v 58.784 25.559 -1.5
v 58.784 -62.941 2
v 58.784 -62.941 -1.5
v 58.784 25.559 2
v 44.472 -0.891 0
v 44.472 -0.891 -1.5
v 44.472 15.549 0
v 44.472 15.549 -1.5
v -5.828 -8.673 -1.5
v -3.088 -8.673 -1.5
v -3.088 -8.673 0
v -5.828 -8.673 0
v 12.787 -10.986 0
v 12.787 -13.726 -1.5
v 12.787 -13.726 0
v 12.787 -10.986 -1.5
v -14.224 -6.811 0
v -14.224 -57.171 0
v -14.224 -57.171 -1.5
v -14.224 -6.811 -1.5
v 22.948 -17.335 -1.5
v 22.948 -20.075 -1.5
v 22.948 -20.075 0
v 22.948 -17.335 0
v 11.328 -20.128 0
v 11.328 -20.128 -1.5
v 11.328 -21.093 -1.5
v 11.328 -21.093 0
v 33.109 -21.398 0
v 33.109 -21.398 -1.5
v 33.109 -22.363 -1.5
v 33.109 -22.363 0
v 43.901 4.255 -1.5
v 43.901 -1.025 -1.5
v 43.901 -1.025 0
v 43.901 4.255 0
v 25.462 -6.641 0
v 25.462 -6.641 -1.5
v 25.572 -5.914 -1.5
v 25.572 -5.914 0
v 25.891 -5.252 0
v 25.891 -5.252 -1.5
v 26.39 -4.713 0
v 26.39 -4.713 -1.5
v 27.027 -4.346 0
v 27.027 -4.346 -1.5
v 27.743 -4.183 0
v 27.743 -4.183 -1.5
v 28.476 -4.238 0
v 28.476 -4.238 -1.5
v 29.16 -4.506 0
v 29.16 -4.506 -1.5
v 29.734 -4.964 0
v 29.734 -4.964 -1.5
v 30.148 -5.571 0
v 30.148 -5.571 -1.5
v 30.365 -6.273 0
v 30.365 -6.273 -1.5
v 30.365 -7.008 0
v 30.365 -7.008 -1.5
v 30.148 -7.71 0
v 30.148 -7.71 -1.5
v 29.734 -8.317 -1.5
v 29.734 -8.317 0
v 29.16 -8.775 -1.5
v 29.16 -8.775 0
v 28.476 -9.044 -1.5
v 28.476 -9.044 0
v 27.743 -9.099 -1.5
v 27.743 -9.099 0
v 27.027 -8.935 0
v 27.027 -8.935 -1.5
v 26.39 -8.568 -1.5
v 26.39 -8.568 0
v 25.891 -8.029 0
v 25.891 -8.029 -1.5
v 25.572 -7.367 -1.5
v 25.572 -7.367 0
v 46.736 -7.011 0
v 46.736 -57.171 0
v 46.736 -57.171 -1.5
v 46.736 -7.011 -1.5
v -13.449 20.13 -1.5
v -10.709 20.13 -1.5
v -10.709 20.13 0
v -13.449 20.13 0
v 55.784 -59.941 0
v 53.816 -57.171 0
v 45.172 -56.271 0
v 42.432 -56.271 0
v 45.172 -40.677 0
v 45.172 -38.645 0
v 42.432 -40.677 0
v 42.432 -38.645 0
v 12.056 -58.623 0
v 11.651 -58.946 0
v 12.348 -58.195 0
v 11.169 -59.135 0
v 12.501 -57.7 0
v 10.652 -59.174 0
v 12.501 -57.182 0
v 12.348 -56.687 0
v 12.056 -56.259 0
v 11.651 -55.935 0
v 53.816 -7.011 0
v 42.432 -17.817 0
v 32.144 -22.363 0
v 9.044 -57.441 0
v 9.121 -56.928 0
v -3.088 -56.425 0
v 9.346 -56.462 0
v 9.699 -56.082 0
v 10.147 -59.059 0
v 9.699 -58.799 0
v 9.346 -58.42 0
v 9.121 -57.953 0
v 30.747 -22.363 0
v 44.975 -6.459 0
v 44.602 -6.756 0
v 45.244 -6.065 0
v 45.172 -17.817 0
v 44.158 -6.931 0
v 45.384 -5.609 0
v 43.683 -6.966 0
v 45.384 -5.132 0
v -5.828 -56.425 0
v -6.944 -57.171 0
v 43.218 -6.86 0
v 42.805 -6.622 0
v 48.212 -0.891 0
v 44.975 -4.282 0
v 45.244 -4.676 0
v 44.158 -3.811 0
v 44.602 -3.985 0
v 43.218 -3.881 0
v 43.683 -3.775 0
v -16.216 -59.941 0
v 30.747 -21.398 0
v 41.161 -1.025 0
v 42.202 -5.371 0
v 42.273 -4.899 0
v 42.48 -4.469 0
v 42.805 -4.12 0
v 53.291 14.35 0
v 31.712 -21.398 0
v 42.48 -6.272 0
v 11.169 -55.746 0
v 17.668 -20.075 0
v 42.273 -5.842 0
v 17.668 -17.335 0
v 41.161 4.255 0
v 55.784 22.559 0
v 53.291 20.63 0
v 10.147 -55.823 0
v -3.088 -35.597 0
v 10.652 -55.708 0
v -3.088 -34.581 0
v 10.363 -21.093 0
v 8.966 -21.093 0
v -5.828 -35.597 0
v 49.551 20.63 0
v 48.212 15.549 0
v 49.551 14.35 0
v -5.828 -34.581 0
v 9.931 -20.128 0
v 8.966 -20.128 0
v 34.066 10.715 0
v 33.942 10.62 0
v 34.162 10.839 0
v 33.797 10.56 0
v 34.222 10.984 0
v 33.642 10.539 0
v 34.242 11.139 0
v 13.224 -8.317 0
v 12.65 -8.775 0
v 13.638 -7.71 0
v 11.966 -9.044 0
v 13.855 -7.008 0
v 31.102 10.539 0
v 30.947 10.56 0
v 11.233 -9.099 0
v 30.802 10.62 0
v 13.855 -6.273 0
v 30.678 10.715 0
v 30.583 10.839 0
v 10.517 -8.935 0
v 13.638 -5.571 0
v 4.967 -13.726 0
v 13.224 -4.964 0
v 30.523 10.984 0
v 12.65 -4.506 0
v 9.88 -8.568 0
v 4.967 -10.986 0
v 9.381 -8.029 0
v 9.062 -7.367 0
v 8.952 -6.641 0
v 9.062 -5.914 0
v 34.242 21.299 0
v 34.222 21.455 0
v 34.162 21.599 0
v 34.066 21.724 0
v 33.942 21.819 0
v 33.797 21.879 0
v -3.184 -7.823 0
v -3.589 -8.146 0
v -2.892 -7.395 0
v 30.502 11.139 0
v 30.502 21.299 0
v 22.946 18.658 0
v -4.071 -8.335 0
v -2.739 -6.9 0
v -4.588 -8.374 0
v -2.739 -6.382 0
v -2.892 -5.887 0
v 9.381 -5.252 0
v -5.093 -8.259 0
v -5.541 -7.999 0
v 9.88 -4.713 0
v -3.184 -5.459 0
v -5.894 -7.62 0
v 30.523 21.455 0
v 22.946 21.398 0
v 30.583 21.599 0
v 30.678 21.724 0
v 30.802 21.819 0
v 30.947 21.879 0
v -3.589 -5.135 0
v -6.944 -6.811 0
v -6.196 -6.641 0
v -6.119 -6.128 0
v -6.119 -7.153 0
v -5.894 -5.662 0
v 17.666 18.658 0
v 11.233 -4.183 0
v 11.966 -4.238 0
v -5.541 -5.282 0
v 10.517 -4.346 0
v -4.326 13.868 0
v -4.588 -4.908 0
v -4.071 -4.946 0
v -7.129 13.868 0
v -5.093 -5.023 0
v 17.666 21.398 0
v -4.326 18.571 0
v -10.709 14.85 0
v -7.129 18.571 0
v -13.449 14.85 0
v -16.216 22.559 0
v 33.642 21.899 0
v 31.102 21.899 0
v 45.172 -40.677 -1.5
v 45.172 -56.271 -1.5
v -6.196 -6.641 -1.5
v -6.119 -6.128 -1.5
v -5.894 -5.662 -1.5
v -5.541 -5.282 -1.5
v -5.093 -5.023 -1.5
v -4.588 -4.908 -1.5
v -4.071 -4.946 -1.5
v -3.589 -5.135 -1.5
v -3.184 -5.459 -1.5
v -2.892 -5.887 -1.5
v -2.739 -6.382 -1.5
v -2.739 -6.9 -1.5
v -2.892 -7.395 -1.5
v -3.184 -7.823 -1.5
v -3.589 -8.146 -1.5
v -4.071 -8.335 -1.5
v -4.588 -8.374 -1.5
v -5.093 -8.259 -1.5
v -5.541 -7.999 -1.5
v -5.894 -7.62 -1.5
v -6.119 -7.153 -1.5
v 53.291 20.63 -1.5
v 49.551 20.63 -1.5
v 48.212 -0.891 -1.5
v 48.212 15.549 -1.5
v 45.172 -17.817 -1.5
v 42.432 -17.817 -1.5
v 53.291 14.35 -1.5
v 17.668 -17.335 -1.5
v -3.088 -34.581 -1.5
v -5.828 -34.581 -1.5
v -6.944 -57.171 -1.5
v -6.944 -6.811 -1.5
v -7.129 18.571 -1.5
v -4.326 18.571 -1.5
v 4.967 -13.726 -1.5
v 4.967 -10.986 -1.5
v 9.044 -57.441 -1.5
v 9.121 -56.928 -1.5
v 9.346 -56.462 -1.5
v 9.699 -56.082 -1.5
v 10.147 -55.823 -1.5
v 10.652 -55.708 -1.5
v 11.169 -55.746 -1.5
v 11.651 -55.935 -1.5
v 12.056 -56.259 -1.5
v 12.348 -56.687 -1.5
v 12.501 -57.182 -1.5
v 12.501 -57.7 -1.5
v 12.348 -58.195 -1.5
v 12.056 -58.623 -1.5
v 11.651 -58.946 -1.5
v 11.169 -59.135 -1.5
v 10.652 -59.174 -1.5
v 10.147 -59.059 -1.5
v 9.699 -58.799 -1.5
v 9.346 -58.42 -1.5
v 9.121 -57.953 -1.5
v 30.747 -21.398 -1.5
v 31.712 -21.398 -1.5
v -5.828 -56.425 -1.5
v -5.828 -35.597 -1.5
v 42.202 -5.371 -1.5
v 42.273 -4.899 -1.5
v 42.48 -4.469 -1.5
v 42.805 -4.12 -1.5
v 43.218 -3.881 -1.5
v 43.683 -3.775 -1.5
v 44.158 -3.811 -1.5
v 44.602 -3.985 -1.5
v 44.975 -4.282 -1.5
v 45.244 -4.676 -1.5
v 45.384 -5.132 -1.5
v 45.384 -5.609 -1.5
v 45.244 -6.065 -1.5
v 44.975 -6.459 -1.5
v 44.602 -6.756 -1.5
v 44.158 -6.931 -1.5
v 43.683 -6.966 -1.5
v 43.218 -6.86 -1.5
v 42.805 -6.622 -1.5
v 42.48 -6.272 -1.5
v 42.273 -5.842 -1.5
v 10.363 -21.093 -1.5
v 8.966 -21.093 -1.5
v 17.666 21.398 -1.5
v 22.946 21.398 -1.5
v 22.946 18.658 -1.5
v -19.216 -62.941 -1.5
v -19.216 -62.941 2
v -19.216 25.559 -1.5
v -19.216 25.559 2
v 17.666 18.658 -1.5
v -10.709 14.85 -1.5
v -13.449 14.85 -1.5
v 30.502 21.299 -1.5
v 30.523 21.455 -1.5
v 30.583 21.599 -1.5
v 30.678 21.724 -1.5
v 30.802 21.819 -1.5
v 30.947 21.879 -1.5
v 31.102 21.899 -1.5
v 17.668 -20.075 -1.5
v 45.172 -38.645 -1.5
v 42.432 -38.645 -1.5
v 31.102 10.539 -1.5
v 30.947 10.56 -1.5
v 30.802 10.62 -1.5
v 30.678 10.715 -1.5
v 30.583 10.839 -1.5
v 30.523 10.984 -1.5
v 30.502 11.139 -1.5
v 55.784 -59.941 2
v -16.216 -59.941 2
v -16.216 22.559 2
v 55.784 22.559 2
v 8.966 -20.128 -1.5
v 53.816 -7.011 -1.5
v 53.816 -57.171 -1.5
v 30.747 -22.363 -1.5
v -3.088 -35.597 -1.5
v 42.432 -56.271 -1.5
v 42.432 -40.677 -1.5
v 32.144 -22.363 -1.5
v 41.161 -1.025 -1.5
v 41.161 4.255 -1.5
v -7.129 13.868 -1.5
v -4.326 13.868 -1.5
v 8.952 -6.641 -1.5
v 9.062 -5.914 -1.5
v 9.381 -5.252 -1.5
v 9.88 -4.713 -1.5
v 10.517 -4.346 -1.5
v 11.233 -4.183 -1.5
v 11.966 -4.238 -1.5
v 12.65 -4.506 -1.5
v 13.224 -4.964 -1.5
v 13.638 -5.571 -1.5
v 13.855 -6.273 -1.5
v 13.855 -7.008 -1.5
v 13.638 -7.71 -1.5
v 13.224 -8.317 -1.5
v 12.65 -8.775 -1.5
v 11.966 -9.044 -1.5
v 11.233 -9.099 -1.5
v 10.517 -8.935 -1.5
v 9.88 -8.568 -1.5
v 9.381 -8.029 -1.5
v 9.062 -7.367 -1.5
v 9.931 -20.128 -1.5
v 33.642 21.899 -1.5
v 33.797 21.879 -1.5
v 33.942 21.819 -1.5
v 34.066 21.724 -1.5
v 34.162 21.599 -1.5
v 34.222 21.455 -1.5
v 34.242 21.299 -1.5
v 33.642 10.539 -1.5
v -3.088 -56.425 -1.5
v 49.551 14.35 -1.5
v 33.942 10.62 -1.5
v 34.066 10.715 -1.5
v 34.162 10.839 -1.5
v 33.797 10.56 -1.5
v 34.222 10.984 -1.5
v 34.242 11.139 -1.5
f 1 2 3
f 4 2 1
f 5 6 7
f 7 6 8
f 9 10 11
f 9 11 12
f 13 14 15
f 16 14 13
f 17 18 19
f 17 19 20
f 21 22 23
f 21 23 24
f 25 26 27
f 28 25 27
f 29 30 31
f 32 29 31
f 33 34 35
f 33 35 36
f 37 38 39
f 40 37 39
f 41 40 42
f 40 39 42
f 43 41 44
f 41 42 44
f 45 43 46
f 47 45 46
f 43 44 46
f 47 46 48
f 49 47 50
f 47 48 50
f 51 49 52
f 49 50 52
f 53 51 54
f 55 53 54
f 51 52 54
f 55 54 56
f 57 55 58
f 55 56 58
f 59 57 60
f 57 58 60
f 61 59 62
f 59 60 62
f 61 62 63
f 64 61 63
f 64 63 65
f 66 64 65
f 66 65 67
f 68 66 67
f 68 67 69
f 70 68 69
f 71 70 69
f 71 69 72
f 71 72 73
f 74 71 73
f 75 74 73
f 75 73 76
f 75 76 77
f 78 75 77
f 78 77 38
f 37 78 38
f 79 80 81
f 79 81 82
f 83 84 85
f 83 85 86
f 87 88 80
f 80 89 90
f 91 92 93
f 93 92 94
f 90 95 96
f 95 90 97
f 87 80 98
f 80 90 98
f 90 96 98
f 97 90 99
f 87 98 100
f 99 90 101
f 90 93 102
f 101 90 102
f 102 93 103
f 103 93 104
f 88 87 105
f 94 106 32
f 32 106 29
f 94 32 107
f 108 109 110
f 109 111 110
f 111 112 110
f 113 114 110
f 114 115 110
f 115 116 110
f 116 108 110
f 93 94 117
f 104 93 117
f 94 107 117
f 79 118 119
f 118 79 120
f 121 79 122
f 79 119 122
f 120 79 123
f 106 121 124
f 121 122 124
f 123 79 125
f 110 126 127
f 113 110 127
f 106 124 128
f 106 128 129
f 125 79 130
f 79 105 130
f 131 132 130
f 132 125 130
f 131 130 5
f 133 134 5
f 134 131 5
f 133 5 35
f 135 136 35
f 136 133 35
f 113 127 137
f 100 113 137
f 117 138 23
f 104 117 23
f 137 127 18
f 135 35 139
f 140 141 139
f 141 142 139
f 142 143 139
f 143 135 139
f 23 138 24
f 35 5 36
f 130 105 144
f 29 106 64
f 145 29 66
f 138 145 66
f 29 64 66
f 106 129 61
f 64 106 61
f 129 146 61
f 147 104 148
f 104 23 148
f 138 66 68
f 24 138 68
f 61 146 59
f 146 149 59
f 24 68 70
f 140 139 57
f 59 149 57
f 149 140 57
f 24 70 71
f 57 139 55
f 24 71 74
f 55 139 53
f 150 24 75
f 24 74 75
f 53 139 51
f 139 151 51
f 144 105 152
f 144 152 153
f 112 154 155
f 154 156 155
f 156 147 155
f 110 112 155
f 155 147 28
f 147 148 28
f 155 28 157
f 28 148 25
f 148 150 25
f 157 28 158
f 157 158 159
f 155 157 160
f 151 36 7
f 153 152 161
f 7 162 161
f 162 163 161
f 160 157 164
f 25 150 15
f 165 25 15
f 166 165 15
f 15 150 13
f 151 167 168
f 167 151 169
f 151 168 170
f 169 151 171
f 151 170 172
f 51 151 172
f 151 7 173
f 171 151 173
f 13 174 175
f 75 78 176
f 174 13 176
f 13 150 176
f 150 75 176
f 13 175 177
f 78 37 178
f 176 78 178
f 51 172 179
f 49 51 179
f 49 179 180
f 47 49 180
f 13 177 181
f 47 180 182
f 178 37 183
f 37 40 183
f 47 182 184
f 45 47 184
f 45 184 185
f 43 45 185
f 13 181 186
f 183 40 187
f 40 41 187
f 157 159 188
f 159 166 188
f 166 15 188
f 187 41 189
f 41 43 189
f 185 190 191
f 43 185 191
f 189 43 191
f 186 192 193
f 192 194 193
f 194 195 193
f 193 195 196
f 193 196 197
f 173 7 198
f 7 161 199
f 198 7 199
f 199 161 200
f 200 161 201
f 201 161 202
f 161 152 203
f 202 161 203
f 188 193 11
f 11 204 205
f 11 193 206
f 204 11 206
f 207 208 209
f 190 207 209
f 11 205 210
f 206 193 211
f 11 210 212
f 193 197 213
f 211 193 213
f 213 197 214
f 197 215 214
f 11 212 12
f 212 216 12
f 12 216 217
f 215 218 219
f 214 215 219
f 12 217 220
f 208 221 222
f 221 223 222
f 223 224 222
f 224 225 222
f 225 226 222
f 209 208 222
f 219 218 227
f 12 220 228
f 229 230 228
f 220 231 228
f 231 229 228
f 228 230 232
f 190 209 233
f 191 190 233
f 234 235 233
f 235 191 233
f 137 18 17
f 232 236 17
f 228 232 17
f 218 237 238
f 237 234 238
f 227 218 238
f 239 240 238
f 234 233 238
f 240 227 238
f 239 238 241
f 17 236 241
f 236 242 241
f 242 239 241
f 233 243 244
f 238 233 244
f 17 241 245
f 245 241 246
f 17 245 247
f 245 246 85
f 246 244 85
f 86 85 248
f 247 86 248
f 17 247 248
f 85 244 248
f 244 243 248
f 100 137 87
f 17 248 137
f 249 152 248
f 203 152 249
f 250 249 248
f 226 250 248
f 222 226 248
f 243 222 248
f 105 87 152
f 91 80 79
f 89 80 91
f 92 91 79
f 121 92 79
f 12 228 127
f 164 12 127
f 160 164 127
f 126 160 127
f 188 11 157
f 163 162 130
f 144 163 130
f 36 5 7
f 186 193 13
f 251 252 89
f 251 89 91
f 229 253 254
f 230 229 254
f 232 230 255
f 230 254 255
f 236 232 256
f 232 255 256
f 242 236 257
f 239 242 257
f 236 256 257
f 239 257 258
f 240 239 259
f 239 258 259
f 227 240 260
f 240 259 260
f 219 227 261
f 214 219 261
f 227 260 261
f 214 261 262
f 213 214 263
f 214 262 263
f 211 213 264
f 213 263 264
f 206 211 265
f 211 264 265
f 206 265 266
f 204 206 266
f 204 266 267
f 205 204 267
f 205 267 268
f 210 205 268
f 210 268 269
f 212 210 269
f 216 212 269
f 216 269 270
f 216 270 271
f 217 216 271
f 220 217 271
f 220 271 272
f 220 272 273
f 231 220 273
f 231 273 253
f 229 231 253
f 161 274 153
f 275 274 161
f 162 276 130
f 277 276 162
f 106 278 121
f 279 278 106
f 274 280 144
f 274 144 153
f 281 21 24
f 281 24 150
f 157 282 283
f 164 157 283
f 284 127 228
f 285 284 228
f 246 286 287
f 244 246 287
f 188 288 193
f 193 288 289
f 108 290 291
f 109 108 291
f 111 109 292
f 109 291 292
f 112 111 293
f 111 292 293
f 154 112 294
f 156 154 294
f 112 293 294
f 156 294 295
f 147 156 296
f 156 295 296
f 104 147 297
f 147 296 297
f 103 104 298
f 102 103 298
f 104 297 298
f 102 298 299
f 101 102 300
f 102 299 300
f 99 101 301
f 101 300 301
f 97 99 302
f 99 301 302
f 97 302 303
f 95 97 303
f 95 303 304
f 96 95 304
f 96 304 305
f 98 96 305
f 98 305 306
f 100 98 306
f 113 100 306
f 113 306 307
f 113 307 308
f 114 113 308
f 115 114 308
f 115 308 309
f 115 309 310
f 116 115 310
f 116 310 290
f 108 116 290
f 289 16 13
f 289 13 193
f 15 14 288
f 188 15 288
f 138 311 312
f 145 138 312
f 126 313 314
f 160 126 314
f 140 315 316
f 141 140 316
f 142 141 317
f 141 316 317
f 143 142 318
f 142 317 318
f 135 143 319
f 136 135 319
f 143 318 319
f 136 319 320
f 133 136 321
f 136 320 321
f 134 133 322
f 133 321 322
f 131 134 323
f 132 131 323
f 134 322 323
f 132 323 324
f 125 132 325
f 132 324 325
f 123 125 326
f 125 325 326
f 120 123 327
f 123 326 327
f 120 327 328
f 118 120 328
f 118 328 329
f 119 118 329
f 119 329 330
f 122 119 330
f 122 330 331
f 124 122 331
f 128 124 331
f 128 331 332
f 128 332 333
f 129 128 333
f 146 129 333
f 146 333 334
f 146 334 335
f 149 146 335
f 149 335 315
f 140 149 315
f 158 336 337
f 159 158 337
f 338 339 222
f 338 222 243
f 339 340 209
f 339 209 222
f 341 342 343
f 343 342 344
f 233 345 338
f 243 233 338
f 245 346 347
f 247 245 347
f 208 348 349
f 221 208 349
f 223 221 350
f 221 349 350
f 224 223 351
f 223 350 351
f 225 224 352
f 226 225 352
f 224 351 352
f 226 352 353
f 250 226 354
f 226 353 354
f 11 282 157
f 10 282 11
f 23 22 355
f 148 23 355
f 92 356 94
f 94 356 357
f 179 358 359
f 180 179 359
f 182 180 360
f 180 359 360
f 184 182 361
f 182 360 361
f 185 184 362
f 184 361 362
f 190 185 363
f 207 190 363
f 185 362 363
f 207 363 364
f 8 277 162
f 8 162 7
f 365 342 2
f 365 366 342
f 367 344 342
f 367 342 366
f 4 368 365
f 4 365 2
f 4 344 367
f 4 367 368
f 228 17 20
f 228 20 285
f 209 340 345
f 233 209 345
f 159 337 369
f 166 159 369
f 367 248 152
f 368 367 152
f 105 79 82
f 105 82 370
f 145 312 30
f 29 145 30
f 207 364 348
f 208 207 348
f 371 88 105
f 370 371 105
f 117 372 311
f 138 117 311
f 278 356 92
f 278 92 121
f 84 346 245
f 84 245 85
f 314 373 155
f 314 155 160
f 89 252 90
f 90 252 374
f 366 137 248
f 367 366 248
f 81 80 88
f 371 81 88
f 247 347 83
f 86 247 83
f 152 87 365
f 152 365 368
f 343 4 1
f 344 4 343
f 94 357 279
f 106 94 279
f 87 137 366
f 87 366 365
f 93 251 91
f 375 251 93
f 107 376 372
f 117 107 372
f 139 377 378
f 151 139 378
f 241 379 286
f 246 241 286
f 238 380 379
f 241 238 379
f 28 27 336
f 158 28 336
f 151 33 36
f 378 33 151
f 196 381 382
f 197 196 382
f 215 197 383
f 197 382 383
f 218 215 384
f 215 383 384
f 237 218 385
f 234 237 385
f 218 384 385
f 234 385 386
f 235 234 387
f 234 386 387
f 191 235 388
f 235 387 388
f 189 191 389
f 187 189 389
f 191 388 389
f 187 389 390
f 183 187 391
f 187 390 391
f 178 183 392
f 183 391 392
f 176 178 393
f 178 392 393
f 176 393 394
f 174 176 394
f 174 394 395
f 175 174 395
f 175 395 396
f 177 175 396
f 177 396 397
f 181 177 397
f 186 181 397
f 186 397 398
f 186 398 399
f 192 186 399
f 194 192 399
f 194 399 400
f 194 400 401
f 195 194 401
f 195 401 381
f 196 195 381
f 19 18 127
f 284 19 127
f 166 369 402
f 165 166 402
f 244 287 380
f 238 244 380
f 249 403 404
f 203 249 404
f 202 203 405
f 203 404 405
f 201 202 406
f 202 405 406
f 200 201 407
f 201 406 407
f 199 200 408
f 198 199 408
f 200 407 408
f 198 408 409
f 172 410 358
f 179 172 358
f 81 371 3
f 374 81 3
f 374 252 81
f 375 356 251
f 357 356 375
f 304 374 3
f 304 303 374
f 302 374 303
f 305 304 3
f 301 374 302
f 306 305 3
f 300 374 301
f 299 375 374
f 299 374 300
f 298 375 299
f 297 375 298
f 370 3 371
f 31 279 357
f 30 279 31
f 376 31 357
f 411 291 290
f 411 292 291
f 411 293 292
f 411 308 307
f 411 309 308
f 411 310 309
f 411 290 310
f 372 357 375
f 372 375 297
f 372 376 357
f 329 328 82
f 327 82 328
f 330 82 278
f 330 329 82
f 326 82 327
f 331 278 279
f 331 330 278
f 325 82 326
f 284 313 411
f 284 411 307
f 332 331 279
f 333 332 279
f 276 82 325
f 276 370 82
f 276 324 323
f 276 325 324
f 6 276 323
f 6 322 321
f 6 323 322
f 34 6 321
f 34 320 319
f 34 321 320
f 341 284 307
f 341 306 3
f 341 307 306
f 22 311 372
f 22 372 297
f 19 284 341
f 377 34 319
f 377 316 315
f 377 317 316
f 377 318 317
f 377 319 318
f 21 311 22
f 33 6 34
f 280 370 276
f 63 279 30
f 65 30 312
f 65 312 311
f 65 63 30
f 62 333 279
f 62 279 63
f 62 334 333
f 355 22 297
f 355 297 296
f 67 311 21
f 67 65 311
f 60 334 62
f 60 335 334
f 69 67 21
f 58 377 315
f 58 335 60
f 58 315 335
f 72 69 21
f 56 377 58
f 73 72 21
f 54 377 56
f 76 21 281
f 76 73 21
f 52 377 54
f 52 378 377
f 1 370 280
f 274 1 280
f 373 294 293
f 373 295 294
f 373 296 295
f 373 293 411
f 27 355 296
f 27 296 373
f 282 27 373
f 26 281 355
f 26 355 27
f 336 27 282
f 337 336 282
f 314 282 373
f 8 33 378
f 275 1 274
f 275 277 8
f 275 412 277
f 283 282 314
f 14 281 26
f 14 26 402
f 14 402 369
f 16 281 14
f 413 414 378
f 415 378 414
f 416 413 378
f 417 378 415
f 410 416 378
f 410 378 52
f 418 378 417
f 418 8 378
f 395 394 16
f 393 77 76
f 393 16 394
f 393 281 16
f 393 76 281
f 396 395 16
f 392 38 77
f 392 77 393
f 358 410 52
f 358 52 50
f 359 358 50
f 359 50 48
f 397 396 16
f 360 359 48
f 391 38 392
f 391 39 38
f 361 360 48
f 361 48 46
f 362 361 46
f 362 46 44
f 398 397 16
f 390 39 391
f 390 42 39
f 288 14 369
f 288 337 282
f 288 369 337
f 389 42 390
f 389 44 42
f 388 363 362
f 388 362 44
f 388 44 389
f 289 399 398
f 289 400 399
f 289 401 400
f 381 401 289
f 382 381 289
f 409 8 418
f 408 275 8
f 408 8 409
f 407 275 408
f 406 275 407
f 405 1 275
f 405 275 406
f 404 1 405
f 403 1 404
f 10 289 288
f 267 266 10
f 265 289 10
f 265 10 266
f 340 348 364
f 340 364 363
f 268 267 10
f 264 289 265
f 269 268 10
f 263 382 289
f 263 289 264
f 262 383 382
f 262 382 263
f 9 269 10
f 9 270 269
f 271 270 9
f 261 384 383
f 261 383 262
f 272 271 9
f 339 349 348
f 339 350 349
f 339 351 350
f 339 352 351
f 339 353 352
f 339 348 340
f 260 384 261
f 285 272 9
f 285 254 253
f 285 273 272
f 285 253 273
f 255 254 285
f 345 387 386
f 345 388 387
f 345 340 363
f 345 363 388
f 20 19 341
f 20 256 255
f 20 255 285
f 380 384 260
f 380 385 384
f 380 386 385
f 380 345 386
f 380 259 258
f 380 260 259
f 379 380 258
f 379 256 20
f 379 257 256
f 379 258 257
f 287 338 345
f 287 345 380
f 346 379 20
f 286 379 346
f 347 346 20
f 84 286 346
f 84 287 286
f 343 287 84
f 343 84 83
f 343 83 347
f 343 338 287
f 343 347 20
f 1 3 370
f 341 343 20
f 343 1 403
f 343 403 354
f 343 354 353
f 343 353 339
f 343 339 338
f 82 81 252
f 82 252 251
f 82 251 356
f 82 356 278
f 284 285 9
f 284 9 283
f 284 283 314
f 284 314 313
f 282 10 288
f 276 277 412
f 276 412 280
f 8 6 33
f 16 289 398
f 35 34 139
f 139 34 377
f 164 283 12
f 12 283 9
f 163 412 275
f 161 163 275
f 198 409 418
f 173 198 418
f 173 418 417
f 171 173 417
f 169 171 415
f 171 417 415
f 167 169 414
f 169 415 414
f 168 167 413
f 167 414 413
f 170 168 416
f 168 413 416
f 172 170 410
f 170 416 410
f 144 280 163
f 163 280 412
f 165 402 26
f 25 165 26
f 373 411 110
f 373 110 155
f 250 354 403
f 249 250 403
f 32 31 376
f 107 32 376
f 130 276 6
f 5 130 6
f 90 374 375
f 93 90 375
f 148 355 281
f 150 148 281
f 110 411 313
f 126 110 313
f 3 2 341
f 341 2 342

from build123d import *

# Parameters (mm, degrees)
SKETCH1_W           = 78
SKETCH1_H           = 88.5
SKETCH1_W_2         = 72
SKETCH1_H_2         = 82.5
BOSS_EXTRUDE1_DEPTH = 2
SKETCH2_W           = 78
SKETCH2_H           = 88.5
BOSS_EXTRUDE2_DEPTH = 1.5
SKETCH7_W           = 7.279998142
SKETCH7_H           = 50.36
SKETCH7_W_2         = 7.079999996
SKETCH7_H_2         = 50.160000192
CUT_EXTRUDE1_DEPTH  = 15
SKETCH8_R           = 1.738
SKETCH8_R_2         = 1.6
CUT_EXTRUDE2_DEPTH  = 10
SKETCH9_R           = 2.464925529
CUT_EXTRUDE3_DEPTH  = 10
SKETCH11_W          = 5.279999902
SKETCH11_H          = 2.74
SKETCH11_W_2        = 2.74
SKETCH11_H_2        = 5.28
SKETCH11_W_3        = 7.819999902
SKETCH11_W_4        = 5.280000098
SKETCH11_H_3        = 2.739999805
CUT_EXTRUDE4_DEPTH  = 10
SKETCH10_W          = 2.740000978
SKETCH10_H          = 25.907999907
SKETCH10_W_2        = 2.739999218
SKETCH10_H_2        = 20.828000093
SKETCH10_W_3        = 2.73999941
SKETCH10_H_3        = 15.594000099
SKETCH10_W_4        = 3.739999409
SKETCH10_H_4        = 16.440000004
SKETCH10_W_5        = 2.739999409
SKETCH10_H_5        = 15.440000004
SKETCH10_W_6        = 3.739999801
SKETCH10_H_6        = 6.280000102
SKETCH10_W_7        = 2.739999801
SKETCH10_H_7        = 5.280000102
CUT_EXTRUDE5_DEPTH  = 10
CUT_EXTRUDE6_DEPTH  = 10


with BuildPart() as part:
    # Sketch1 → Boss-Extrude1 (new body)
    with BuildSketch(Plane.XY):
        with Locations((19.784172662, -18.690647482)):
            Rectangle(SKETCH1_W, SKETCH1_H)
        with Locations((19.784172662, -18.690647482)):
            Rectangle(SKETCH1_W_2, SKETCH1_H_2, mode=Mode.SUBTRACT)
    extrude(amount=BOSS_EXTRUDE1_DEPTH)

    # Sketch2 → Boss-Extrude2 (add)
    with BuildSketch(Plane(origin=(0, 0, 0), x_dir=(-1, 0, 0), z_dir=(0, 0, -1))):
        with Locations((-19.784172662, -18.690647482)):
            Rectangle(SKETCH2_W, SKETCH2_H)
    extrude(amount=BOSS_EXTRUDE2_DEPTH)

    # Sketch7 → Cut-Extrude1 (cut)
    with BuildSketch(Plane.XY):
        with Locations((-10.583804942, -31.990645157)):
            Rectangle(SKETCH7_W, SKETCH7_H)
        with Locations((50.276195985, -32.090647407)):
            Rectangle(SKETCH7_W_2, SKETCH7_H_2)
    extrude(amount=-CUT_EXTRUDE1_DEPTH, mode=Mode.SUBTRACT)

    # Sketch8 → Cut-Extrude2 (cut)
    with BuildSketch(Plane(origin=(0, 0, -1.5), x_dir=(-1, 0, 0), z_dir=(0, 0, -1))):
        with Locations((-10.782151243, -57.440646574)):
            Circle(SKETCH8_R)
        with Locations((4.457850712, -6.640647161)):
            Circle(SKETCH8_R)
        with Locations((-43.802149239, -5.370645303)):
            Circle(SKETCH8_R_2)
    extrude(amount=-CUT_EXTRUDE2_DEPTH, mode=Mode.SUBTRACT)

    # Sketch9 → Cut-Extrude3 (cut)
    with BuildSketch(Plane(origin=(0, 0, -1.5), x_dir=(-1, 0, 0), z_dir=(0, 0, -1))):
        with Locations((-27.927151828, -6.640645914)):
            Circle(SKETCH9_R)
        with Locations((-11.417149288, -6.64064655)):
            Circle(SKETCH9_R)
    extrude(amount=-CUT_EXTRUDE3_DEPTH, mode=Mode.SUBTRACT)

    # Sketch11 → Cut-Extrude4 (cut)
    with BuildSketch(Plane(origin=(0, 0, -1.5), x_dir=(-1, 0, 0), z_dir=(0, 0, -1))):
        with Locations((-20.306157662, 20.028363095)):
            Rectangle(SKETCH11_W, SKETCH11_H)
        with Locations((-42.531158468, 1.615345297)):
            Rectangle(SKETCH11_W_2, SKETCH11_H_2)
        with Locations((-8.877149508, -12.355646794)):
            Rectangle(SKETCH11_W_3, SKETCH11_H)
        with Locations((-20.308140255, -18.704655608)):
            Rectangle(SKETCH11_W_4, SKETCH11_H_3)
        with Locations((12.078842143, 17.490343195)):
            Rectangle(SKETCH11_W_2, SKETCH11_H_2)
    extrude(amount=-CUT_EXTRUDE4_DEPTH, mode=Mode.SUBTRACT)

    # Sketch10 → Cut-Extrude5 (cut)
    # profile 1 of 10: a face of its own
    with BuildSketch(Plane(origin=(0, 0, -1.5), x_dir=(-1, 0, 0), z_dir=(0, 0, -1))):
        with Locations((4.457850135, -21.62664716)):
            Rectangle(SKETCH10_W, SKETCH10_H)
    # profile 2 of 10: a face of its own
    with BuildSketch(Plane(origin=(0, 0, -1.5), x_dir=(-1, 0, 0), z_dir=(0, 0, -1))):
        with Locations((4.457849197, -46.01064716)):
            Rectangle(SKETCH10_W_2, SKETCH10_H_2)
    # profile 3 of 10: a face of its own
    with BuildSketch(Plane(origin=(0, 0, -1.5), x_dir=(-1, 0, 0), z_dir=(0, 0, -1))):
        with Locations((-43.802150903, -48.473645307)):
            Rectangle(SKETCH10_W_3, SKETCH10_H_3)
    # profile 4 of 10: a face of its own
    with BuildSketch(Plane(origin=(0, 0, -1.5), x_dir=(-1, 0, 0), z_dir=(0, 0, -1))):
        with Locations((-43.802150119, -28.230645304)):
            Rectangle(SKETCH10_W_2, SKETCH10_H_2)
    # profile 5 of 10: a face of its own
    with BuildSketch(Plane(origin=(0, 0, -1.5), x_dir=(-1, 0, 0), z_dir=(0, 0, -1))):
        with Locations((-46.342148749, 7.329354744)):
            Rectangle(SKETCH10_W_4, SKETCH10_H_4)
        with Locations((-46.342148749, 7.329354744)):
            Rectangle(SKETCH10_W_5, SKETCH10_H_5, mode=Mode.SUBTRACT)
    # profile 6 of 10: a face of its own
    with BuildSketch(Plane(origin=(0, 0, -1.5), x_dir=(-1, 0, 0), z_dir=(0, 0, -1))):
        with Locations((-46.342148749, 7.329354744)):
            Rectangle(SKETCH10_W_5, SKETCH10_H_5)
    # profile 7 of 10: a face of its own
    with BuildSketch(Plane(origin=(0, 0, -1.5), x_dir=(-1, 0, 0), z_dir=(0, 0, -1))):
        with Locations((-51.421157761, 17.490345588)):
            Rectangle(SKETCH10_W_6, SKETCH10_H_6)
        with Locations((-51.421157761, 17.490345588)):
            Rectangle(SKETCH10_W_7, SKETCH10_H_7, mode=Mode.SUBTRACT)
    # profile 8 of 10: a face of its own
    with BuildSketch(Plane(origin=(0, 0, -1.5), x_dir=(-1, 0, 0), z_dir=(0, 0, -1))):
        with Locations((-51.421157761, 17.490345588)):
            Rectangle(SKETCH10_W_7, SKETCH10_H_7)
    # profile 9 of 10: a face of its own
    with BuildSketch(Plane(origin=(0, 0, -1.5), x_dir=(-1, 0, 0), z_dir=(0, 0, -1))):
        with BuildLine():
            Line((-31.10214819, 21.899354208), (-33.64214819, 21.899354306))
            ThreePointArc((-33.64214819, 21.899354306), (-34.066412265, 21.723618391), (-34.242148213, 21.299354329))
            Line((-34.242148213, 21.299354329), (-34.242148604, 11.139354329))
            ThreePointArc((-34.242148604, 11.139354329), (-34.066412689, 10.715090253), (-33.642148627, 10.539354306))
            Line((-33.642148627, 10.539354306), (-31.102148627, 10.539354208))
            ThreePointArc((-31.102148627, 10.539354208), (-30.677884552, 10.715090123), (-30.502148604, 11.139354185))
            Line((-30.502148604, 11.139354185), (-30.502148213, 21.299354185))
            ThreePointArc((-30.502148213, 21.299354185), (-30.677884128, 21.72361826), (-31.10214819, 21.899354208))
        make_face()
        with BuildLine():
            ThreePointArc((-33.742148604, 11.139354309), (-33.712859285, 11.06864363), (-33.642148608, 11.039354306))
            Line((-33.642148608, 11.039354306), (-31.102148608, 11.039354208))
            ThreePointArc((-31.102148608, 11.039354208), (-31.031437929, 11.068643527), (-31.002148604, 11.139354204))
            Line((-31.002148604, 11.139354204), (-31.002148213, 21.299354204))
            ThreePointArc((-31.002148213, 21.299354204), (-31.031437532, 21.370064883), (-31.102148209, 21.399354208))
            Line((-31.102148209, 21.399354208), (-33.642148209, 21.399354306))
            ThreePointArc((-33.642148209, 21.399354306), (-33.712858888, 21.370064986), (-33.742148213, 21.299354309))
            Line((-33.742148213, 21.299354309), (-33.742148604, 11.139354309))
        make_face(mode=Mode.SUBTRACT)
    # profile 10 of 10: a face of its own
    with BuildSketch(Plane(origin=(0, 0, -1.5), x_dir=(-1, 0, 0), z_dir=(0, 0, -1))):
        with BuildLine():
            Line((-33.742148213, 21.299354309), (-33.742148604, 11.139354309))
            ThreePointArc((-33.742148604, 11.139354309), (-33.712859285, 11.06864363), (-33.642148608, 11.039354306))
            Line((-33.642148608, 11.039354306), (-31.102148608, 11.039354208))
            ThreePointArc((-31.102148608, 11.039354208), (-31.031437929, 11.068643527), (-31.002148604, 11.139354204))
            Line((-31.002148604, 11.139354204), (-31.002148213, 21.299354204))
            ThreePointArc((-31.002148213, 21.299354204), (-31.031437532, 21.370064883), (-31.102148209, 21.399354208))
            Line((-31.102148209, 21.399354208), (-33.642148209, 21.399354306))
            ThreePointArc((-33.642148209, 21.399354306), (-33.712858888, 21.370064986), (-33.742148213, 21.299354309))
        make_face()
    extrude(amount=-CUT_EXTRUDE5_DEPTH, mode=Mode.SUBTRACT)

    # Sketch12 → Cut-Extrude6 (cut)
    with BuildSketch(Plane(origin=(0, 0, -1.5), x_dir=(-1, 0, 0), z_dir=(0, 0, -1))):
        Polygon((-33.108749893, -22.363499715), (-32.143549893, -22.363499752), (-30.746549856, -22.363499715), (-30.746549856, -21.398299806), (-31.711749856, -21.398299769), (-33.108749893, -21.398299806), align=None)
        Polygon((-11.328249844, -20.128046644), (-11.328249844, -21.093246553), (-10.363049844, -21.09324659), (-8.966049807, -21.093246553), (-8.966049807, -20.128046644), (-9.931249807, -20.128046607), align=None)
        Polygon((4.326251742, 13.867754697), (5.826253641, 13.867754697), (7.129451441, 13.867754697), (7.129451441, 18.570950884), (5.629449542, 18.570950884), (4.326251742, 18.570950884), align=None)
    extrude(amount=-CUT_EXTRUDE6_DEPTH, mode=Mode.SUBTRACT)


solid = part.part
